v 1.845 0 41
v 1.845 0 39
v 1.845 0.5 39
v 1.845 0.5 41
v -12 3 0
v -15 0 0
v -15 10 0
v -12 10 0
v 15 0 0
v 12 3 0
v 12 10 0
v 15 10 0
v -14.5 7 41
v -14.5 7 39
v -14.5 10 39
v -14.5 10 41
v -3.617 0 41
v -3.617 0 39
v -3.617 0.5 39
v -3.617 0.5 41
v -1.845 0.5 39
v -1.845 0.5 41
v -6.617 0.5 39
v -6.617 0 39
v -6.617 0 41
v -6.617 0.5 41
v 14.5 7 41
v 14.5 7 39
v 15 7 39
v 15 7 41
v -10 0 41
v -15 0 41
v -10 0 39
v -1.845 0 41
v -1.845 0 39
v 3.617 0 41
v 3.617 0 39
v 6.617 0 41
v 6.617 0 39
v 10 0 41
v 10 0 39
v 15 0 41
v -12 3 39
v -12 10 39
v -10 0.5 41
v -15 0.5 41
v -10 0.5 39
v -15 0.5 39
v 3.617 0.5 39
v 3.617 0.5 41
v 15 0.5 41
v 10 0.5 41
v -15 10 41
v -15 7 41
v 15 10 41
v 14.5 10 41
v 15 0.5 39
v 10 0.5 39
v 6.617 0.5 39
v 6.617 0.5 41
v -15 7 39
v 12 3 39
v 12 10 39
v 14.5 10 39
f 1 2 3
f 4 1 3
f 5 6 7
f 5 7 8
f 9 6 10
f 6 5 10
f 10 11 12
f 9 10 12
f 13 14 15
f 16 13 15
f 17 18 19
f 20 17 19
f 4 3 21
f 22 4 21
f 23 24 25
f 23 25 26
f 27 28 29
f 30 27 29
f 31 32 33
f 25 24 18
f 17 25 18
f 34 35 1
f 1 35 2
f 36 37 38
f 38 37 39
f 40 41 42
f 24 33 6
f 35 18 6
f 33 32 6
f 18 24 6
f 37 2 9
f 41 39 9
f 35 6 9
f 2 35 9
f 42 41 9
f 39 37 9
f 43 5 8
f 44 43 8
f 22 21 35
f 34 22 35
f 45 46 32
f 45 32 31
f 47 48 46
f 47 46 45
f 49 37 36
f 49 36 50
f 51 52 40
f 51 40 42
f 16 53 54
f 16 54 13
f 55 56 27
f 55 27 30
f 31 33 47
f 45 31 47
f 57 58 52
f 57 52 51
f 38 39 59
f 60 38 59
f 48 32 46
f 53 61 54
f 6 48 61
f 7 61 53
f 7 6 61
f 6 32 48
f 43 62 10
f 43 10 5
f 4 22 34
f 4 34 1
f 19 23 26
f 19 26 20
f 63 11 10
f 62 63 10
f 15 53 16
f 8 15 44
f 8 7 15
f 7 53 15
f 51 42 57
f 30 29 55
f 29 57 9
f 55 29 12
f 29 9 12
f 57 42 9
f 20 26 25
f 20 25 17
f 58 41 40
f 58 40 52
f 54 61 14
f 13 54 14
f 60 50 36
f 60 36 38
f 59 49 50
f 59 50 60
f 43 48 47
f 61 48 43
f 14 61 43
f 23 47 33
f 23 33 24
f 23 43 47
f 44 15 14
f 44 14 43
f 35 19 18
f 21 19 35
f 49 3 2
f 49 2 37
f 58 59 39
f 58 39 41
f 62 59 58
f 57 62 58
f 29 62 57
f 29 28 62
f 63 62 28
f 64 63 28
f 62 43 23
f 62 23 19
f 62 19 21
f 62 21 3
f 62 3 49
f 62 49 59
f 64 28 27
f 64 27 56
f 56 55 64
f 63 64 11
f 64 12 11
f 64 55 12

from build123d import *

# Parameters (mm, degrees)
F1_DEPTH = 39
F2_W     = 0.5
F2_H     = 3
F2_W_2   = 5
F2_H_2   = 0.5
F2_W_3   = 3
F3_DEPTH = 2


with BuildPart() as f1:
    # F0 (on Top) → F1 (new body)
    with BuildSketch(Plane.XY):
        Polygon((-15, 0), (0, 0), (15, 0), (15, 10), (12, 10), (12, 3), (-12, 3), (-12, 10), (-15, 10), align=None)
    extrude(amount=F1_DEPTH)

    # F2 (on face) → F3 (join)
    with BuildSketch(Plane.XY.offset(39)):
        with Locations((-14.75, 8.5)):
            Rectangle(F2_W, F2_H)
        with Locations((-12.5, 0.25)):
            Rectangle(F2_W_2, F2_H_2)
        with Locations((-5.117418, 0.25)):
            Rectangle(F2_W_3, F2_H_2)
        Polygon((-1.844762, 0.5), (-1.844762, 0), (0, 0), (1.844762, 0), (1.844762, 0.5), (0, 0.5), align=None)
        with Locations((5.117418, 0.25)):
            Rectangle(F2_W_3, F2_H_2)
        with Locations((12.5, 0.25)):
            Rectangle(F2_W_2, F2_H_2)
        with Locations((14.75, 8.5)):
            Rectangle(F2_W, F2_H)
    extrude(amount=F3_DEPTH)


solid = f1.part
